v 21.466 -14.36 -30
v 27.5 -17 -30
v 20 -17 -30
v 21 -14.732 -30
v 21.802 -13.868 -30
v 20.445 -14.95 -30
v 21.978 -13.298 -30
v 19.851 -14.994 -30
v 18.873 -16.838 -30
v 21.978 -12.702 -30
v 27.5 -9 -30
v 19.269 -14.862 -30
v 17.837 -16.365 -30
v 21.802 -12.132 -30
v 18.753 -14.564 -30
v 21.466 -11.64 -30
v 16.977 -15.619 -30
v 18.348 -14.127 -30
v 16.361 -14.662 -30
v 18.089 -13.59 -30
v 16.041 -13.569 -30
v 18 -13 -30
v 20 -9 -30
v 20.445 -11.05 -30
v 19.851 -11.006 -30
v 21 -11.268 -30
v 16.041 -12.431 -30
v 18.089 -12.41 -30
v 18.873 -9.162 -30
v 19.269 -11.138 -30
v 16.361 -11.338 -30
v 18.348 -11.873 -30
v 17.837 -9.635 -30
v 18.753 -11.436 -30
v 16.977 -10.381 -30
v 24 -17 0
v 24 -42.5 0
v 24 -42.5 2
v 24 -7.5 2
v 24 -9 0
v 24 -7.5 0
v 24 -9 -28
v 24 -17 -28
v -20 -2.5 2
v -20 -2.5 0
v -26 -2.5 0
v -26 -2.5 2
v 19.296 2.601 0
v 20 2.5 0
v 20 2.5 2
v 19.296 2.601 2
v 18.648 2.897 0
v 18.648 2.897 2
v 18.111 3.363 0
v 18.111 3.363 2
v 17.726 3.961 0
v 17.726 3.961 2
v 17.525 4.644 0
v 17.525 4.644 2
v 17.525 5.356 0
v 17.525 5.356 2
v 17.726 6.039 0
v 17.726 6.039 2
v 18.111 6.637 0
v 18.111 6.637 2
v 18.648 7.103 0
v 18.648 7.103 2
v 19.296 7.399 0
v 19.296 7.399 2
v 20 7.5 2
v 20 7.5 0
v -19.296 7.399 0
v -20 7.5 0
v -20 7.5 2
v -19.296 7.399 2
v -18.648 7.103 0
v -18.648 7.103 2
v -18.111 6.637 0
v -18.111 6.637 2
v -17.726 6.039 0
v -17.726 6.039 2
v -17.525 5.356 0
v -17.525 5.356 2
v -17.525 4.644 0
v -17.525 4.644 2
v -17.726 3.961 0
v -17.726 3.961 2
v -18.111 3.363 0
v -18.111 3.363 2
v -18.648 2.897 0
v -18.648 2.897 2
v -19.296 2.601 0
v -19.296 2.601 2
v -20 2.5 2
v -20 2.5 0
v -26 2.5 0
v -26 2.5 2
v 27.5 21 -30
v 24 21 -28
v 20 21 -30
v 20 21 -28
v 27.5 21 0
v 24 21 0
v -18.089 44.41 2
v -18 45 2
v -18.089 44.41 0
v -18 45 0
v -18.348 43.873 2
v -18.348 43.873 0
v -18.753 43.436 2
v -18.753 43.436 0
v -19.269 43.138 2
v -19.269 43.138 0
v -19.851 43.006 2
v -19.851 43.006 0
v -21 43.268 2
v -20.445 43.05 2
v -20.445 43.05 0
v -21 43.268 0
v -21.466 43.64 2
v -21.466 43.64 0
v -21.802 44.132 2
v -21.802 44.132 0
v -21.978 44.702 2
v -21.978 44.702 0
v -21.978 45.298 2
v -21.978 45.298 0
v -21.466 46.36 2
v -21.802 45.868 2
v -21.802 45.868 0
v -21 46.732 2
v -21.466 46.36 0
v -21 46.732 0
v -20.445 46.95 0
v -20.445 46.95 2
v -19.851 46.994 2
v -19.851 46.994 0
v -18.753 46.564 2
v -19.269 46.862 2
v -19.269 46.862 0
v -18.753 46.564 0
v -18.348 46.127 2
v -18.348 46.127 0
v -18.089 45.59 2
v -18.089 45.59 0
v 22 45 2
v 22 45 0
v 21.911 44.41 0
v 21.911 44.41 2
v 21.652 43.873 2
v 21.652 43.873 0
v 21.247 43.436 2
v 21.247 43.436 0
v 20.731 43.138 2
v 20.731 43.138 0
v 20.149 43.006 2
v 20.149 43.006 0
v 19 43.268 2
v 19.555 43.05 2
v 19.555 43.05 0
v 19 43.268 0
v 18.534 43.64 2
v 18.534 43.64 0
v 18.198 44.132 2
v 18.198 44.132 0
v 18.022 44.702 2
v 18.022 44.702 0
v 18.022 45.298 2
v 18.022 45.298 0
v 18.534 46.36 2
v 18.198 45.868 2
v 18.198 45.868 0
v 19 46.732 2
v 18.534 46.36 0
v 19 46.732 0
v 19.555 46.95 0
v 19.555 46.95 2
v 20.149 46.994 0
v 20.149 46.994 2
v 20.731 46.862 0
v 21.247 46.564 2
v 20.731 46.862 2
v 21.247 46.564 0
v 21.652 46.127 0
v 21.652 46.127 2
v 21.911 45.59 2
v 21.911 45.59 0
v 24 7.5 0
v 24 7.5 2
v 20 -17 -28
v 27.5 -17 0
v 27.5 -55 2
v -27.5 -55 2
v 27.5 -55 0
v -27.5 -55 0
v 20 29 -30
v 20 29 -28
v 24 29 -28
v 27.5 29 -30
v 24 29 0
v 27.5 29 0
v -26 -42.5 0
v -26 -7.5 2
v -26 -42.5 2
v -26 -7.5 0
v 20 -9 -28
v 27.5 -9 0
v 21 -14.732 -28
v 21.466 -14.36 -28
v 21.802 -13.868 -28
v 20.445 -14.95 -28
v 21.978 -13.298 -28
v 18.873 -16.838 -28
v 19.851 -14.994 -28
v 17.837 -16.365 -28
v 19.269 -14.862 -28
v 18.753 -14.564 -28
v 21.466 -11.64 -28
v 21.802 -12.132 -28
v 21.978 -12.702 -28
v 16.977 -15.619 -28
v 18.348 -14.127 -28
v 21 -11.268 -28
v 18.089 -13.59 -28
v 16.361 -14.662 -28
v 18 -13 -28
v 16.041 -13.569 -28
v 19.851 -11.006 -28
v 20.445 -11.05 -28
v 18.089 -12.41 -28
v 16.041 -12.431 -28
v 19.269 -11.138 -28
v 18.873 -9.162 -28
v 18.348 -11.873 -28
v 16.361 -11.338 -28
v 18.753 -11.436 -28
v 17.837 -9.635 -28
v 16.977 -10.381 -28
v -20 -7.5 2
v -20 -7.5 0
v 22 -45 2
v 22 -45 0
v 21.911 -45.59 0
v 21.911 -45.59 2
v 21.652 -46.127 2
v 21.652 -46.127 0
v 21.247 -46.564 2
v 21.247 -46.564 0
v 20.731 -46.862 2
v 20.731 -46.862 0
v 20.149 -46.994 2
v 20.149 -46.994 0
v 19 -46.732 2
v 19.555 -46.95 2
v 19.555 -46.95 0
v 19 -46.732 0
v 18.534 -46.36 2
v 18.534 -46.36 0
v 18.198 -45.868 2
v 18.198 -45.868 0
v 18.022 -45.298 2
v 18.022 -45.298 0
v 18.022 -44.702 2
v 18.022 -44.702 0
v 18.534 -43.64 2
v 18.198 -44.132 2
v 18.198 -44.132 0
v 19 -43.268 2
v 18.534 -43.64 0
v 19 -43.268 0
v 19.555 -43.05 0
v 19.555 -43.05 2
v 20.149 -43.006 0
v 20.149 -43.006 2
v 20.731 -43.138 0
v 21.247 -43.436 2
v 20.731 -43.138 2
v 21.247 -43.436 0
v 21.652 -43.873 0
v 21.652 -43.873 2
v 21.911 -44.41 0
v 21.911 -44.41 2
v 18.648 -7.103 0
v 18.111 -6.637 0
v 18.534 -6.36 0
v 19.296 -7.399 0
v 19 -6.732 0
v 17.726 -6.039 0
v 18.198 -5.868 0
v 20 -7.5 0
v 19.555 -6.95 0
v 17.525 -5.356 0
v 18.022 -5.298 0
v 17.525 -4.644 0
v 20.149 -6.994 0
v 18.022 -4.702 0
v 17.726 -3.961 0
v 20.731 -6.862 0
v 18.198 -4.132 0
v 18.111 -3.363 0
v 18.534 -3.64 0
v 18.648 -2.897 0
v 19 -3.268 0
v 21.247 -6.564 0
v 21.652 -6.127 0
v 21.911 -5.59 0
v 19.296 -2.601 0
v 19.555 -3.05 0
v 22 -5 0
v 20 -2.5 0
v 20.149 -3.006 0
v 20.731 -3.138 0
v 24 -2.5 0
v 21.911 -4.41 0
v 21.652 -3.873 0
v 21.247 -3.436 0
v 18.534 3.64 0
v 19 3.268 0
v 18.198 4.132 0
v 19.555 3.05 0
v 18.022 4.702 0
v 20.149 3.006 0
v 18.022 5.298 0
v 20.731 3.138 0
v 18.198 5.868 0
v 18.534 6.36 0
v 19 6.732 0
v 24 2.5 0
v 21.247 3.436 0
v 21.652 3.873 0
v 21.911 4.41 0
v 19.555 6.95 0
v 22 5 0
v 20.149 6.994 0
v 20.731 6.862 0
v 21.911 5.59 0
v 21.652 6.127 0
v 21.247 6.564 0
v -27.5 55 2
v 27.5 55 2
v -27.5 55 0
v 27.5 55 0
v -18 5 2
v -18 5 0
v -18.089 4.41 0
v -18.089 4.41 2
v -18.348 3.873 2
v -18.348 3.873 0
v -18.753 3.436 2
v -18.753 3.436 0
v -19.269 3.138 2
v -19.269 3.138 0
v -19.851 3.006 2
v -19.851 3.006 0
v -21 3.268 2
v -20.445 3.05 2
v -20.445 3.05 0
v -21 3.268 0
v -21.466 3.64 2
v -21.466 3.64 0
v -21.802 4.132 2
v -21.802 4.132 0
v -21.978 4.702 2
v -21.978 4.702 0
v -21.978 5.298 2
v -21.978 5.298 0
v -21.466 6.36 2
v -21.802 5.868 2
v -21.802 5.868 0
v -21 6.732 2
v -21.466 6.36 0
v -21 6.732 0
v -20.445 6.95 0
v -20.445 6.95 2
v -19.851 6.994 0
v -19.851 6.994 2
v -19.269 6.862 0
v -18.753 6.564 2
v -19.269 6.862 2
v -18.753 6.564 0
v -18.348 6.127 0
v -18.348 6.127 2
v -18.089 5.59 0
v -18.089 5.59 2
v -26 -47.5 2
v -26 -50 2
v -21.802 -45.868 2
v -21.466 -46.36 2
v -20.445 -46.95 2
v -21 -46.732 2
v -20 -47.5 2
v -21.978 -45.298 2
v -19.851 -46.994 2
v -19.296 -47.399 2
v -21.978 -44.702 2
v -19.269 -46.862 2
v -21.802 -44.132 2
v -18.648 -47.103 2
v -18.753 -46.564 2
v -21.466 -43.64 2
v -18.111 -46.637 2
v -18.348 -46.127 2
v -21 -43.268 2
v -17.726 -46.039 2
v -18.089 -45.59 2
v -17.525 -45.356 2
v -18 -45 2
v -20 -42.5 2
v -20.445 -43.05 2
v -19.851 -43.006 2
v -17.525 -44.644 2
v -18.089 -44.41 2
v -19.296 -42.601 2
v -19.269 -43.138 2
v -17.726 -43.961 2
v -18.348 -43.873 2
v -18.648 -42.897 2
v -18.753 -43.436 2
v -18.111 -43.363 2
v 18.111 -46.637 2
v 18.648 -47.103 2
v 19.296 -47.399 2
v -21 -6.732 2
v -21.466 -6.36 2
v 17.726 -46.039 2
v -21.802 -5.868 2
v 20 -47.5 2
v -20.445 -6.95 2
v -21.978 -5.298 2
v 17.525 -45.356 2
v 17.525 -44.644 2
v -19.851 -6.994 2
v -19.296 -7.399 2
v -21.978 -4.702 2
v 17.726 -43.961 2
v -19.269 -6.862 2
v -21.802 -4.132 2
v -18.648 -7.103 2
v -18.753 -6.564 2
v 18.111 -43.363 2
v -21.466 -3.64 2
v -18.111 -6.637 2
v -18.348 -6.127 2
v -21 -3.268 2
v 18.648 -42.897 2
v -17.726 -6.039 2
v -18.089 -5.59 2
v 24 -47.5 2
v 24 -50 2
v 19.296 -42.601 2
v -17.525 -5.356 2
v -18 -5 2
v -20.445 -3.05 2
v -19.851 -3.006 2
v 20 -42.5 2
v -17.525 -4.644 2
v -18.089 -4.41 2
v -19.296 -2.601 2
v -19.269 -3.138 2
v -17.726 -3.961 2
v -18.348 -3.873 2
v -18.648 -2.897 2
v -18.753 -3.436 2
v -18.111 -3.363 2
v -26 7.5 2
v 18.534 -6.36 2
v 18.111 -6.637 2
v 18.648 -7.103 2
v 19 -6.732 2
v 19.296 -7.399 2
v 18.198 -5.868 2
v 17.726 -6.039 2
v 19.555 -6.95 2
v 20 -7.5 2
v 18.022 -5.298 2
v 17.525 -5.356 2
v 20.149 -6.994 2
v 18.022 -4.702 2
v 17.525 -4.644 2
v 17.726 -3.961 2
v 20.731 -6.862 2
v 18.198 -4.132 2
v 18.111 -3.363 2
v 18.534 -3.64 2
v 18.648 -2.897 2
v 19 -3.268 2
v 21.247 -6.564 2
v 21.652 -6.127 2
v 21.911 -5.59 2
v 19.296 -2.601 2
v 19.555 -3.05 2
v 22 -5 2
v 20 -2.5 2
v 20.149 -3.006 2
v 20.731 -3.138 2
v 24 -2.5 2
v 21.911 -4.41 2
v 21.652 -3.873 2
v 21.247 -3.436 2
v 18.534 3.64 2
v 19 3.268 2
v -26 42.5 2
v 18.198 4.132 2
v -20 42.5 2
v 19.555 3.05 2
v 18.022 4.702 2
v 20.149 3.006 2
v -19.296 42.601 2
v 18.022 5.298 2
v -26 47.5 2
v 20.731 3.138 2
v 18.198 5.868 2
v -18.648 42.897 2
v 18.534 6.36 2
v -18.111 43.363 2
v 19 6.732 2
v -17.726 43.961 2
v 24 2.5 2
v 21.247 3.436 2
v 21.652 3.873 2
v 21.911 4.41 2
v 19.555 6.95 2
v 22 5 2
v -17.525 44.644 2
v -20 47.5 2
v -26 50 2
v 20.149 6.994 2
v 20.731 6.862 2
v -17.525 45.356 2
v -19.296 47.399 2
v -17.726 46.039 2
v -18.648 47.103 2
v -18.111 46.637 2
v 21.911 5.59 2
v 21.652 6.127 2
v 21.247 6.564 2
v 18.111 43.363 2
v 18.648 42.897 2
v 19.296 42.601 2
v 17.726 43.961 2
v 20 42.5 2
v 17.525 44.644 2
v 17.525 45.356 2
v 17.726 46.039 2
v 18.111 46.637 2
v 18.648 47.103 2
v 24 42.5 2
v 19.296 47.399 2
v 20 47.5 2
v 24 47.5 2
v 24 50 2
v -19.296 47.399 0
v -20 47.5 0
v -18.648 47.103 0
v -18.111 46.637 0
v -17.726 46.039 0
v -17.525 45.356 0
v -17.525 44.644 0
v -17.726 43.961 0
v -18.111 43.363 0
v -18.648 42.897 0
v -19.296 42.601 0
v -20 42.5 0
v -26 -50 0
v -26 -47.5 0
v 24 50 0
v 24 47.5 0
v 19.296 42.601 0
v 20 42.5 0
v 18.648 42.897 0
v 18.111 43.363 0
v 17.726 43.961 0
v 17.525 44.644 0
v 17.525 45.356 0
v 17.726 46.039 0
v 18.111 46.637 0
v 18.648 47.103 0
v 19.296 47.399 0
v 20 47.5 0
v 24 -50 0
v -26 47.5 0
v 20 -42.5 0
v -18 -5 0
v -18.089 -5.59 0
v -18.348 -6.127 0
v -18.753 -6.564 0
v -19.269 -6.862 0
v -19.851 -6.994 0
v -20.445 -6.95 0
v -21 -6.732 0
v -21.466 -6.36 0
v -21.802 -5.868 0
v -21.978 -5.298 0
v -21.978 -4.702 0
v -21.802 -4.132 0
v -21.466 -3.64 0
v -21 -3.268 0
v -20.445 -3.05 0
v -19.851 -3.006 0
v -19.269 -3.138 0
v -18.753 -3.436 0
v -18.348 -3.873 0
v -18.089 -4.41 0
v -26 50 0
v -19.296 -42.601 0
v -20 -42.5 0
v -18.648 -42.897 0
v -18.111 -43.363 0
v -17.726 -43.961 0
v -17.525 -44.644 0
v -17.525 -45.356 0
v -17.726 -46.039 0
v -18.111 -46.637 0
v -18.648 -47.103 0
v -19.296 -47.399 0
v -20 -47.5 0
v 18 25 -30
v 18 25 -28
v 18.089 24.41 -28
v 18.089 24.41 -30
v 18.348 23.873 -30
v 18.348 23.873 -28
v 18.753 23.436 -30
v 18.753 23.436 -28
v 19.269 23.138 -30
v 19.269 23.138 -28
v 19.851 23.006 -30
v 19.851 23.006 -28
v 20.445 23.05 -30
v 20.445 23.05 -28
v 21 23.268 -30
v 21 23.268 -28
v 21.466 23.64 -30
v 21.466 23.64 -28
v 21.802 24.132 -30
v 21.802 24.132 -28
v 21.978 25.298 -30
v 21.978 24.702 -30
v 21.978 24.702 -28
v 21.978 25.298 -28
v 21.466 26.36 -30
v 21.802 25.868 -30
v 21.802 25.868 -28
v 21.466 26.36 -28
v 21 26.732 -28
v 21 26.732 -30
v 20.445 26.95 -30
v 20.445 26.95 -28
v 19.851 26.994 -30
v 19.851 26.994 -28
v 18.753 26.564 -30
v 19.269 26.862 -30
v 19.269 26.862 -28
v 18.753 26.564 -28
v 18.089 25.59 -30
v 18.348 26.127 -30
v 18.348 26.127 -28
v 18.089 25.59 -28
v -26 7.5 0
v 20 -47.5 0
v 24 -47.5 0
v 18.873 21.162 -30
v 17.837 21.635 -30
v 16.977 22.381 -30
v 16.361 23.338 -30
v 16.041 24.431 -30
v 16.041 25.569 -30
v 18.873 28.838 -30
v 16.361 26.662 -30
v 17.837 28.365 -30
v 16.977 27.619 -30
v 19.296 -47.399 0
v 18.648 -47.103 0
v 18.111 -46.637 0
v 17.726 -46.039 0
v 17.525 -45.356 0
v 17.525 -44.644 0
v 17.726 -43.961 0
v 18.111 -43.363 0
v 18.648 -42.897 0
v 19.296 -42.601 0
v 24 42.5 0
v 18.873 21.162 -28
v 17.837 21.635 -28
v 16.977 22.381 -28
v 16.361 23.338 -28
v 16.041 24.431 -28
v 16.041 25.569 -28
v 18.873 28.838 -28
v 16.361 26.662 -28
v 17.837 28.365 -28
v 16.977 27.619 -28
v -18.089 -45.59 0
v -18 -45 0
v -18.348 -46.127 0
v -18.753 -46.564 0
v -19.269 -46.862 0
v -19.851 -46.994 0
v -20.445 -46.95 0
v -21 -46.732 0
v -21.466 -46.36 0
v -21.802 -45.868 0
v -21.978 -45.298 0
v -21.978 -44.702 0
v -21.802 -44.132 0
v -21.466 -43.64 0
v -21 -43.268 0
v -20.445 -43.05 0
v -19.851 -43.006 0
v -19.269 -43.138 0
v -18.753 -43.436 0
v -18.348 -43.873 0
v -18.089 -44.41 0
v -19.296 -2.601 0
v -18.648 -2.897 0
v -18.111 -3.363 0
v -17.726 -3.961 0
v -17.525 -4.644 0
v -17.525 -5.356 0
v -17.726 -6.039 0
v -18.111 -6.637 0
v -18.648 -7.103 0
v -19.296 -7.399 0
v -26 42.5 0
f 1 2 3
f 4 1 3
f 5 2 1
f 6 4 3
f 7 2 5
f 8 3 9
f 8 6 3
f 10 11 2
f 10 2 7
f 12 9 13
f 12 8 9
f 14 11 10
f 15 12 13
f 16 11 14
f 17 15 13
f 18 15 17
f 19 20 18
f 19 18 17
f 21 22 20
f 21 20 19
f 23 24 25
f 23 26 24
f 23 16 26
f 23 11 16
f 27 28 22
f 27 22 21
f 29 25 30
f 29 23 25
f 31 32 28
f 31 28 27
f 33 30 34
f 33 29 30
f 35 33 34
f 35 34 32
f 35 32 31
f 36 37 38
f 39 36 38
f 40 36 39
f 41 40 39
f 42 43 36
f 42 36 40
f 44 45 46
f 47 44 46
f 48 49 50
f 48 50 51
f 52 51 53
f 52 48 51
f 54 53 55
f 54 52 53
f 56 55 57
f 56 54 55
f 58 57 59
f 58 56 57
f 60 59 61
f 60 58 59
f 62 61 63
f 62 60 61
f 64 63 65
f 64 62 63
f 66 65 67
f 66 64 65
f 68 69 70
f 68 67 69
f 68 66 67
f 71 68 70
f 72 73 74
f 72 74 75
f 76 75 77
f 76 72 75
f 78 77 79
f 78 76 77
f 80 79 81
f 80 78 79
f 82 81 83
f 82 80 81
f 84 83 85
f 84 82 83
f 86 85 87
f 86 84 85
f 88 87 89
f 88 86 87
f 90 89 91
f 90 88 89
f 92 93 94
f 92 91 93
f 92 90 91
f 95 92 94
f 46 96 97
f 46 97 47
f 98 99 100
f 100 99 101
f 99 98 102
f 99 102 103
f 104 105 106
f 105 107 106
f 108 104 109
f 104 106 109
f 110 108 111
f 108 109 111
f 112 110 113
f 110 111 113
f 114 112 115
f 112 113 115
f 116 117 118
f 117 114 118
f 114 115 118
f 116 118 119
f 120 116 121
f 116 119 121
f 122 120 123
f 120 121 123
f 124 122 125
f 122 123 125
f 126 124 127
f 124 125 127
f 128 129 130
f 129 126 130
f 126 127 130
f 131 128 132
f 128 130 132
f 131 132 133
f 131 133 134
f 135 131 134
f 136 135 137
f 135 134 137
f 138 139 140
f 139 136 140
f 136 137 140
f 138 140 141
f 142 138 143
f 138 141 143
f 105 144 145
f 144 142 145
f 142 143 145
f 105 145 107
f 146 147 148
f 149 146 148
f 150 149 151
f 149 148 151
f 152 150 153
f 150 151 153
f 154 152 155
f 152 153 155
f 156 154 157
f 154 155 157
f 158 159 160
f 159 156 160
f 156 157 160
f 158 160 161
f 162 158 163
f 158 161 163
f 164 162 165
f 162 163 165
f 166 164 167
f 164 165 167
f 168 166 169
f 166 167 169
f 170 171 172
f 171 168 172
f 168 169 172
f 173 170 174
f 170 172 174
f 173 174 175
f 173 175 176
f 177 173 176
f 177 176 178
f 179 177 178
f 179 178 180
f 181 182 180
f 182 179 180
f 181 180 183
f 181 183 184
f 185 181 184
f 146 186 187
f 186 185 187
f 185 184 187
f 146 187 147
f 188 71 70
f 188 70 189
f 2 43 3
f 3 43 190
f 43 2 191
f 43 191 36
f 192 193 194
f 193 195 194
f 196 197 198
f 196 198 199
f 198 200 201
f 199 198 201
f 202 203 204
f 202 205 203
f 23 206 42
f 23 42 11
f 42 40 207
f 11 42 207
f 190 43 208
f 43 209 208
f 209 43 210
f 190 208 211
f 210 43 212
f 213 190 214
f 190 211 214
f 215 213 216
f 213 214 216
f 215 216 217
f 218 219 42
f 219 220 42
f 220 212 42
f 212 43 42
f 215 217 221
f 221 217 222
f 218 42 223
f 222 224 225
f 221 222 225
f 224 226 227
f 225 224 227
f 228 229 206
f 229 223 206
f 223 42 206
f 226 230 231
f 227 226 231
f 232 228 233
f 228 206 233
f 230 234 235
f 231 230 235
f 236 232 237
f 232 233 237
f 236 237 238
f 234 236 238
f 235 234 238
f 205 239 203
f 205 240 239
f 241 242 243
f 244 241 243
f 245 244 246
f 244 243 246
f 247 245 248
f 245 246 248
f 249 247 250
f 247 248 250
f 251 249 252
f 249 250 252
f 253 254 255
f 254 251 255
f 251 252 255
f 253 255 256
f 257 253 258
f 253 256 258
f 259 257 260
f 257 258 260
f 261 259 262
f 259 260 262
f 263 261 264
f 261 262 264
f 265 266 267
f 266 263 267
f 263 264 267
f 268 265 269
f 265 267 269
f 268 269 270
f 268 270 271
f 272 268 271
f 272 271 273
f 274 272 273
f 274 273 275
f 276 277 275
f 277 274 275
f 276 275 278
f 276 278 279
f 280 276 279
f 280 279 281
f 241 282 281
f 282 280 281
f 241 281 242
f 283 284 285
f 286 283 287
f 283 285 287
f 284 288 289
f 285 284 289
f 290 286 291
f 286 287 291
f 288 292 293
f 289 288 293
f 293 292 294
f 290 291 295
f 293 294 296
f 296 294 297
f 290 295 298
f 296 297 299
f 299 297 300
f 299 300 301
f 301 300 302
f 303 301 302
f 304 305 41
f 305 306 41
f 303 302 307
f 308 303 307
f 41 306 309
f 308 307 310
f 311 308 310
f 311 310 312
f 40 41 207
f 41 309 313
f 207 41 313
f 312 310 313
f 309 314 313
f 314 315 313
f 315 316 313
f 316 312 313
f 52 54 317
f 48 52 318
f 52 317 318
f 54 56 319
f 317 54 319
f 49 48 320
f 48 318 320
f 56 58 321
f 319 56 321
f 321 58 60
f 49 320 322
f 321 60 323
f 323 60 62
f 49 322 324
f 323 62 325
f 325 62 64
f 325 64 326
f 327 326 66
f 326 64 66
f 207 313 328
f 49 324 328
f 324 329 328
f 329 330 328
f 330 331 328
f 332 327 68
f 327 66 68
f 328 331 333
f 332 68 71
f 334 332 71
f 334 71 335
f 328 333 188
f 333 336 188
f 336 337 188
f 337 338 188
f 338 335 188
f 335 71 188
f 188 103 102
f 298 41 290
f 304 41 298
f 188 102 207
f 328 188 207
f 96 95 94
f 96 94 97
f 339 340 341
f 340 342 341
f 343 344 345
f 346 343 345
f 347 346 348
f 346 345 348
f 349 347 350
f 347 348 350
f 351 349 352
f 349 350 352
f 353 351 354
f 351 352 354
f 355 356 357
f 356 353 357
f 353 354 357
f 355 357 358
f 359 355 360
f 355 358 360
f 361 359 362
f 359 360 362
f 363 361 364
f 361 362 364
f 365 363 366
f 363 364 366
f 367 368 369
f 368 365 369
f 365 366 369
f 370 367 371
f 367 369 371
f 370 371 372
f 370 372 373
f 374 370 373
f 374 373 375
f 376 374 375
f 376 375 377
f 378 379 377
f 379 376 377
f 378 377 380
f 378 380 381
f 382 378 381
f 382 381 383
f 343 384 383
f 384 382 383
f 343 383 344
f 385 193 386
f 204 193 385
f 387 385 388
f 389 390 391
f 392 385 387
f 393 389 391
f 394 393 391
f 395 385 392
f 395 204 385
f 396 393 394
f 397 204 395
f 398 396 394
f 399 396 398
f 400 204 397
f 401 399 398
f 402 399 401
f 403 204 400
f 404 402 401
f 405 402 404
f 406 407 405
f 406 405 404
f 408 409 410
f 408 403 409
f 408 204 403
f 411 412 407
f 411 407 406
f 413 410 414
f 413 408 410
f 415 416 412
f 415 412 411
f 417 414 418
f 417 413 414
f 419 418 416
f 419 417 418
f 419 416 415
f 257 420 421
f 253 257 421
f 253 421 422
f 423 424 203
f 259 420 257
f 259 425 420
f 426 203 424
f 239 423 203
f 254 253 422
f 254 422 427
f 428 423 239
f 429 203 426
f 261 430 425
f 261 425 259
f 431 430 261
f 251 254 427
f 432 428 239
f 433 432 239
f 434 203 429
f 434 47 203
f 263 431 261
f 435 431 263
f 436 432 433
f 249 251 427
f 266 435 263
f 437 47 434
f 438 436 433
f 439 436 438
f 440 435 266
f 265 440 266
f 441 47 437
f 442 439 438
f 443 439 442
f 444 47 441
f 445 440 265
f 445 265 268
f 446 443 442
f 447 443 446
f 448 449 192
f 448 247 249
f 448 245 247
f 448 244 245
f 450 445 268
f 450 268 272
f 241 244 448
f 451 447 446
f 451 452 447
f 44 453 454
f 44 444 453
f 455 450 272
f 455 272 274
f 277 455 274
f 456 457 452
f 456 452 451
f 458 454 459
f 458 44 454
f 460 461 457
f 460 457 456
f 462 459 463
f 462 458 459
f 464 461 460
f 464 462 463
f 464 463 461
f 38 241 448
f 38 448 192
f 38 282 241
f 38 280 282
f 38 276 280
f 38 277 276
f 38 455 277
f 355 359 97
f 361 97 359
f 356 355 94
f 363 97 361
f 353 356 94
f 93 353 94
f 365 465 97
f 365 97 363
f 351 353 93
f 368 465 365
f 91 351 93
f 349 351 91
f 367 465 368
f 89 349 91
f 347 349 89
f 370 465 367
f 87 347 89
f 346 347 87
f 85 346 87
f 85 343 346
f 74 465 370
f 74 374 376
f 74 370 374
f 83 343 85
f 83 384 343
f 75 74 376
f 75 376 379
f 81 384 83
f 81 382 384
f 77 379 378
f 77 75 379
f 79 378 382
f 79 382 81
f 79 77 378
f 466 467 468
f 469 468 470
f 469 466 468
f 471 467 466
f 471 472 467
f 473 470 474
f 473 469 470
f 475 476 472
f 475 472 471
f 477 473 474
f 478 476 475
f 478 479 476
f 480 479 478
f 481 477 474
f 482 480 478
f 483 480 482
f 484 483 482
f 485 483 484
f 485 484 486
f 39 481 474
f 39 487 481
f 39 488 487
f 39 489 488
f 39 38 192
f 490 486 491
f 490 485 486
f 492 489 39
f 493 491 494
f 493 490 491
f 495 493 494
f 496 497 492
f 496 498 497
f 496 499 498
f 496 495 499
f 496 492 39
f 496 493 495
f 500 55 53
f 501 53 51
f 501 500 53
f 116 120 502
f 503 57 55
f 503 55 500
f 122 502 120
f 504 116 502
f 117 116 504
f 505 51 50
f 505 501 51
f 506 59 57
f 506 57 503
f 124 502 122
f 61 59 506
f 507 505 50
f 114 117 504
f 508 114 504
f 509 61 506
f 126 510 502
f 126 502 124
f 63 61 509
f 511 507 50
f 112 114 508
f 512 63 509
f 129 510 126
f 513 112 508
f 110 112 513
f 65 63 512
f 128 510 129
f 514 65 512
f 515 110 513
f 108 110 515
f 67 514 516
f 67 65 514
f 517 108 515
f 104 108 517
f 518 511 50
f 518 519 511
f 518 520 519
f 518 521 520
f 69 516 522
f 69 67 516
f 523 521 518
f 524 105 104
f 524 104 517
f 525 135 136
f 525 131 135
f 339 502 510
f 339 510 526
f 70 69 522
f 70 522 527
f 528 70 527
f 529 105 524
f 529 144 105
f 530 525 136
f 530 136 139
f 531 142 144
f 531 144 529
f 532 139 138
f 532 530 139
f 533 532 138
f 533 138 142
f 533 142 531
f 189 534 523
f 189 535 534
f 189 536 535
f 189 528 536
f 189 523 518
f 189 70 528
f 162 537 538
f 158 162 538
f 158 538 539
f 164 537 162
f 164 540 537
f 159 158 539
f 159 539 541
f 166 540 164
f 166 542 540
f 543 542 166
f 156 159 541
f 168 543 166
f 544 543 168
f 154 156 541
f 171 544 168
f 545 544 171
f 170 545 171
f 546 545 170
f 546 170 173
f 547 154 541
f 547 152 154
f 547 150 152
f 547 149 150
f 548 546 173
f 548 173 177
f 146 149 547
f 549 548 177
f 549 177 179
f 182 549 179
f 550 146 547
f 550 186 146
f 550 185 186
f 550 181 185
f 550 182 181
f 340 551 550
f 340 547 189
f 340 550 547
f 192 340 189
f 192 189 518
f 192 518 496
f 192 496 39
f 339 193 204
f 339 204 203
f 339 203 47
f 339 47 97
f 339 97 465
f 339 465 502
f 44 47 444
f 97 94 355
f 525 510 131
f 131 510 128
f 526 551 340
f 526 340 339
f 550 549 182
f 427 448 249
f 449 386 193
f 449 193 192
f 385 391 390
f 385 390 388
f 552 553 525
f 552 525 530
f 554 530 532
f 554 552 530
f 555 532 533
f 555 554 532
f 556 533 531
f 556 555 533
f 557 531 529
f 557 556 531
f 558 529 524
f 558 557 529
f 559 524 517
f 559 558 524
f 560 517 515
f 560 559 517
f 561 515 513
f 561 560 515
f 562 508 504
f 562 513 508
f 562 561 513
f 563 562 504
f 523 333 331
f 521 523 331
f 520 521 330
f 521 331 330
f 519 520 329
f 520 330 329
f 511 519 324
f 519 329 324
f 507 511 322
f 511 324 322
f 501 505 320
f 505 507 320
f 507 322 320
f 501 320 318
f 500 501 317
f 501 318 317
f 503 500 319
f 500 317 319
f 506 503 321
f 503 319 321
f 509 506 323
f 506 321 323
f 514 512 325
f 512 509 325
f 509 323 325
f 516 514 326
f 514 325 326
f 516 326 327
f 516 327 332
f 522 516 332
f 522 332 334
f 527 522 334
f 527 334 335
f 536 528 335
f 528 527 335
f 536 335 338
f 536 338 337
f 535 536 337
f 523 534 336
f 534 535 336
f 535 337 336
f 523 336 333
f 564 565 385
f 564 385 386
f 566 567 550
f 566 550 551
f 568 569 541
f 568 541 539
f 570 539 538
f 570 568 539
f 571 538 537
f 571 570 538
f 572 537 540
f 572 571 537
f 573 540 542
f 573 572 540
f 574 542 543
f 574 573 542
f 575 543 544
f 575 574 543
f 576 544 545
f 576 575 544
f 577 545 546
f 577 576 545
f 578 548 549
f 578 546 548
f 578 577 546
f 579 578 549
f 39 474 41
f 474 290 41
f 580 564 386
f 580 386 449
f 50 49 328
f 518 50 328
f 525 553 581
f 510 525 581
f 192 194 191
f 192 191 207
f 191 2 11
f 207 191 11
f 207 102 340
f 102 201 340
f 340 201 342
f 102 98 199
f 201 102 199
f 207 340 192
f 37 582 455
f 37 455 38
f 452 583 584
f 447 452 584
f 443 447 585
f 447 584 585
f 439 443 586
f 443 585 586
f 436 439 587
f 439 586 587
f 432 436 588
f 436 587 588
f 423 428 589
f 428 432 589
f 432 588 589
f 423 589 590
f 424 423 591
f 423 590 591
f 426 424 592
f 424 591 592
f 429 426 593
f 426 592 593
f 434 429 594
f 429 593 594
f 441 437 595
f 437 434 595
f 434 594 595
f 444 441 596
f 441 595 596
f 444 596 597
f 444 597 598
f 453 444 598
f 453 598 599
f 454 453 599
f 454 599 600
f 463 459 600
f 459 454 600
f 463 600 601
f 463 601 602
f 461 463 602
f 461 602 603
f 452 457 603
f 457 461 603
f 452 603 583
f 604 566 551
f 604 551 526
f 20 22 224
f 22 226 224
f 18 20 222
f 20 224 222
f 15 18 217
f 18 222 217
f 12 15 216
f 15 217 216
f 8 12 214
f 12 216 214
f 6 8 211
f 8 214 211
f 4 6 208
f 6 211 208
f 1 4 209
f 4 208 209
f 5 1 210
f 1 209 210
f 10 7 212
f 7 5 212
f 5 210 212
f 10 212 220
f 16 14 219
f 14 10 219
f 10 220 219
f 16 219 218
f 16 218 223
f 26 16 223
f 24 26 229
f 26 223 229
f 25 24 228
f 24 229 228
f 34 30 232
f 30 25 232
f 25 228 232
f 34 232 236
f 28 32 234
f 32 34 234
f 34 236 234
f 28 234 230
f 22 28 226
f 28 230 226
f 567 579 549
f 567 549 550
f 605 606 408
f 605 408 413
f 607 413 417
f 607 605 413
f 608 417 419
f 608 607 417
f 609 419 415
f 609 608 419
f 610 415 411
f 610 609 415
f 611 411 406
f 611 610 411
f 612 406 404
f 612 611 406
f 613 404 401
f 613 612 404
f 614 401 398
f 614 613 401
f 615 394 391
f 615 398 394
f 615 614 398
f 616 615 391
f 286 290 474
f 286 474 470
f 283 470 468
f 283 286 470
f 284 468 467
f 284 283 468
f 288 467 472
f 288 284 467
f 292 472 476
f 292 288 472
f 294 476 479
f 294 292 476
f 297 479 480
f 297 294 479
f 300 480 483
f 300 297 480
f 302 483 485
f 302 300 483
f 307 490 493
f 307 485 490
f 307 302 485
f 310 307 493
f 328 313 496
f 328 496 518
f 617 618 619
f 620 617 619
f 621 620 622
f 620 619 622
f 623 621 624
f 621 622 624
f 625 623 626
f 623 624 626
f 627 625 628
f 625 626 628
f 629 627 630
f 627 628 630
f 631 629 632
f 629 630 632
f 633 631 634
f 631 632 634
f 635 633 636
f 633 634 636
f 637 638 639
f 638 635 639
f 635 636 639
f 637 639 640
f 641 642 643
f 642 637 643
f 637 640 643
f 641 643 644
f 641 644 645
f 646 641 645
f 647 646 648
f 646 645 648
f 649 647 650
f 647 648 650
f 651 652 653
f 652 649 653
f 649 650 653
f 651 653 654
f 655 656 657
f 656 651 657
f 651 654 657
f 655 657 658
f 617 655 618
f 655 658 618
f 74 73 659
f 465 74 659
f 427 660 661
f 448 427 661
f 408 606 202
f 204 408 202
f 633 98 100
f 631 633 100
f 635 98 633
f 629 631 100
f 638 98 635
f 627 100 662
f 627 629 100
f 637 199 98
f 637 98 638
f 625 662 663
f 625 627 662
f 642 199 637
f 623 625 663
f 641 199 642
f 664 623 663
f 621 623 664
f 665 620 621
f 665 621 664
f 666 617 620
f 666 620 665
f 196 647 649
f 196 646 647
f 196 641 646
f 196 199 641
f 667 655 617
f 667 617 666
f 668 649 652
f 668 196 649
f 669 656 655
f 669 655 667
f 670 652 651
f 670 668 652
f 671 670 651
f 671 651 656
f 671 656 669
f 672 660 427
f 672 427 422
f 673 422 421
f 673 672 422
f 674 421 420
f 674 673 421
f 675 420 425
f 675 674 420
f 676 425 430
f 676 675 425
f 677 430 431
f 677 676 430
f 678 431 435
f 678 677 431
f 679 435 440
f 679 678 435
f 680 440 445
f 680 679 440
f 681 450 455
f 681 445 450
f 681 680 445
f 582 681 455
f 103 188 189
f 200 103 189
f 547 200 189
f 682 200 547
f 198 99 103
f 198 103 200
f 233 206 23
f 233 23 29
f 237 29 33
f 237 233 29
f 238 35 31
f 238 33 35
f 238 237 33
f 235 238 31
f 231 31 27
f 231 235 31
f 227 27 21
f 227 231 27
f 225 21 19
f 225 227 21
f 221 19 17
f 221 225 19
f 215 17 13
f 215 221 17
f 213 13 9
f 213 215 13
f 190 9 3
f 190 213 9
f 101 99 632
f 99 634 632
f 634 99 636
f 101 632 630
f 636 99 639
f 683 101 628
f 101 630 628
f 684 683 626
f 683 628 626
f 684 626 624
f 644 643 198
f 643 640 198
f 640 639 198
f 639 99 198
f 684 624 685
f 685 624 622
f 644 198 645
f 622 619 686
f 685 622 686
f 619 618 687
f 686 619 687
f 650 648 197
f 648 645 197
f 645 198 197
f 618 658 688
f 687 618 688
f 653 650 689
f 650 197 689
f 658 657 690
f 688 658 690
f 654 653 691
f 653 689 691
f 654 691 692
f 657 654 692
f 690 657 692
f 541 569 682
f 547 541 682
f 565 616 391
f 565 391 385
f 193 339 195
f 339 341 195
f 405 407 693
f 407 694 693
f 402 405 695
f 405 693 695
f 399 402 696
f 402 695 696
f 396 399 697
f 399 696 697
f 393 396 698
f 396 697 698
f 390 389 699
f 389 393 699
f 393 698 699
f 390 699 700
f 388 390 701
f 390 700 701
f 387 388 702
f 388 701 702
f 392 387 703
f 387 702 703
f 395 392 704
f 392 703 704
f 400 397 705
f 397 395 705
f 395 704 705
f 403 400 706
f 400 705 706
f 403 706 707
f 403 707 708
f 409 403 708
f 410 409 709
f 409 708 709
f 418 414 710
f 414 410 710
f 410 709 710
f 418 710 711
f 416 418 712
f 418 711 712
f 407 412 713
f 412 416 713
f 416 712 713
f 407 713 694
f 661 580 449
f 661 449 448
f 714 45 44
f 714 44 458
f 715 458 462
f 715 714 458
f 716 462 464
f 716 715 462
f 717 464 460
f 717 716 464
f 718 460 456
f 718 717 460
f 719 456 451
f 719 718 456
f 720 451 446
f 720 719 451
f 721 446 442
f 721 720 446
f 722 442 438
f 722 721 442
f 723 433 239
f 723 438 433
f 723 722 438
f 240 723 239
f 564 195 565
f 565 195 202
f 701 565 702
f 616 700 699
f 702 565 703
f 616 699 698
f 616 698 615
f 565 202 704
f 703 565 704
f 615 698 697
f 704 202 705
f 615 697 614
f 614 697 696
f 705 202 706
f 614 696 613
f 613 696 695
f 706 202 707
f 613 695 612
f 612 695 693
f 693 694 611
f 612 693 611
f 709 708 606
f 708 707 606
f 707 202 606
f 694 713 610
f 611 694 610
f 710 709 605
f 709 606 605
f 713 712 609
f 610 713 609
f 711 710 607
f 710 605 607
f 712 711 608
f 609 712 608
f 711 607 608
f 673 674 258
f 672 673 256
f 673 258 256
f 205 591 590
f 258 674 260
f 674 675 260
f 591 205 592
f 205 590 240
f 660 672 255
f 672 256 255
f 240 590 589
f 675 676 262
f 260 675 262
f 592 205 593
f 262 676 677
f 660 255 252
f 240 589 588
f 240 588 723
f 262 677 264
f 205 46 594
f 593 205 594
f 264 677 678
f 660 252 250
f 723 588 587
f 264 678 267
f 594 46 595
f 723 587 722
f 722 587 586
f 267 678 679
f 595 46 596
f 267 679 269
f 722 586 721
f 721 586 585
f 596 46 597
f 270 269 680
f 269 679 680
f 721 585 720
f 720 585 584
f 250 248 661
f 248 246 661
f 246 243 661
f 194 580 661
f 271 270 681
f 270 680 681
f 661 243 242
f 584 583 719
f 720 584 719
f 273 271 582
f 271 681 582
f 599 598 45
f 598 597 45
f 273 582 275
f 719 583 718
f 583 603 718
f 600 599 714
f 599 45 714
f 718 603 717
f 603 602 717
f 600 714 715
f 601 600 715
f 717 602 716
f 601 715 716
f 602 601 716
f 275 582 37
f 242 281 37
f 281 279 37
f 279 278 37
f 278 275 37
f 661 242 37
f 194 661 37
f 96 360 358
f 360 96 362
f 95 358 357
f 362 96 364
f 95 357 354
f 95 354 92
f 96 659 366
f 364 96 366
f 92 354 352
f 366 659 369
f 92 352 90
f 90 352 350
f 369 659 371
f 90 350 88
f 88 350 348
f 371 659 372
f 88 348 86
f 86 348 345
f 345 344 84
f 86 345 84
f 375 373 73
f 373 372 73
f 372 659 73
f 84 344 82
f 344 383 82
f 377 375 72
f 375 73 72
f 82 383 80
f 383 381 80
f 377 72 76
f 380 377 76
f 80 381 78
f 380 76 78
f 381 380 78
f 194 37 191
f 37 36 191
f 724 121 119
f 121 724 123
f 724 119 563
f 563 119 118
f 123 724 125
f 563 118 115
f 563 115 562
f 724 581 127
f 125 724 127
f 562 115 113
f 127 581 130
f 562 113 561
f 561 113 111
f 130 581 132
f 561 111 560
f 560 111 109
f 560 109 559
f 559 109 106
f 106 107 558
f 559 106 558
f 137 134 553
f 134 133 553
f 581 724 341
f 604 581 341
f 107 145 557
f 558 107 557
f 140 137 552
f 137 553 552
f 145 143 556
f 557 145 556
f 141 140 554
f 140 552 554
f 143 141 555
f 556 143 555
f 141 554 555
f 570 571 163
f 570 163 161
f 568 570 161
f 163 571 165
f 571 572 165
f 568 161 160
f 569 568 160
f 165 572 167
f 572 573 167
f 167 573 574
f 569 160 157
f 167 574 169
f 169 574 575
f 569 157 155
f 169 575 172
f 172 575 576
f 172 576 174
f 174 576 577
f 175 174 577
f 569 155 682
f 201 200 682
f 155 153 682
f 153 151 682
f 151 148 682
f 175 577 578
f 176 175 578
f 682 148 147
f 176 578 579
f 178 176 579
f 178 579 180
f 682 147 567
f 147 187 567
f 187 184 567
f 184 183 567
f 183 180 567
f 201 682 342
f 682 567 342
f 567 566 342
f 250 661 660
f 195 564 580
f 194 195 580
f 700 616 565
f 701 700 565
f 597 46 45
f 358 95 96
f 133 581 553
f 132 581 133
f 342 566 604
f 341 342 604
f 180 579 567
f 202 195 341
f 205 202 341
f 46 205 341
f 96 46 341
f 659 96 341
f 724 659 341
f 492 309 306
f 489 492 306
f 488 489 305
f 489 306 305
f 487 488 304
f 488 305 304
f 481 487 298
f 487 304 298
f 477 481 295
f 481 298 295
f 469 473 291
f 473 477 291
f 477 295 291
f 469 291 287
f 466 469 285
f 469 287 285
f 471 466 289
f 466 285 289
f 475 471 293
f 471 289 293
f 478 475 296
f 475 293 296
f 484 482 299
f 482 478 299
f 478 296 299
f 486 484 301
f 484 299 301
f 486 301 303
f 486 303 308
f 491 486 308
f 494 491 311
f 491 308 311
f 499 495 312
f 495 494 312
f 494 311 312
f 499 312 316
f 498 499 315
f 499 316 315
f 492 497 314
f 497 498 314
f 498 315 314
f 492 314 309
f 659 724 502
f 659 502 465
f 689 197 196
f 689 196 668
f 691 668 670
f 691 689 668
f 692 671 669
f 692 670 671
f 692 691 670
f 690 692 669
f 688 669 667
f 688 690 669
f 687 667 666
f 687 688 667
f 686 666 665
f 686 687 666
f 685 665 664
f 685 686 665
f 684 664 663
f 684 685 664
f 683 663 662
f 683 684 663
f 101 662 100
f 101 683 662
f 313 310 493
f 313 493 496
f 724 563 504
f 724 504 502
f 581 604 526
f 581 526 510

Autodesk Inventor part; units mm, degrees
ref_plane "YZ Plane" through (0, 0, 0) normal (1, 0, 0) x (0, 1, 0)
ref_plane "XZ Plane" through (0, 0, 0) normal (0, 1, 0) x (-1, 0, 0)
ref_plane "XY Plane" through (0, 0, 0) normal (0, 0, 1) x (1, 0, 0)
sketch "Sketch1" plane through (0, 0, 0) normal (0, 0, 1) x (1, 0, 0)
  line L0 (-27.5, -55) -> (27.5, -55)
  line L1 (27.5, -55) -> (27.5, 55)
  line L2 (27.5, 55) -> (-27.5, 55)
  line L3 (-27.5, 55) -> (-27.5, -55)
  line L4 (-27.5, -55) -> (27.5, 55) construction
  line L5 (27.5, -55) -> (-27.5, 55) construction
  line L6 (0, -77) -> (0, 77) projected
  line L7 (-38.5, 0) -> (38.5, 0) projected
  circle A0 centre (-20, 45) radius 2
  circle A1 centre (-20, 5) radius 2
  circle A2 centre (20, 45) radius 2
  circle A3 centre (20, 5) radius 2
  circle A4 centre (-20, -5) radius 2
  circle A5 centre (-20, -45) radius 2
  circle A6 centre (20, -45) radius 2
  circle A7 centre (20, -5) radius 2
  arc A8 (-20, 42.5) -> (-20, 47.5) centre (-20, 45) ccw
  arc A9 (20, 47.5) -> (20, 42.5) centre (20, 45) ccw
  arc A10 (-20, 2.5) -> (-20, 7.5) centre (-20, 5) ccw
  arc A11 (20, 7.5) -> (20, 2.5) centre (20, 5) ccw
  arc A12 (-20, -7.5) -> (-20, -2.5) centre (-20, -5) ccw
  arc A13 (20, -2.5) -> (20, -7.5) centre (20, -5) ccw
  arc A14 (-20, -47.5) -> (-20, -42.5) centre (-20, -45) ccw
  arc A15 (20, -42.5) -> (20, -47.5) centre (20, -45) ccw
  line L8 (-26, -50) -> (24, -50)
  line L9 (24, -50) -> (24, 50)
  line L10 (24, 50) -> (-26, 50)
  line L11 (-26, 50) -> (-26, -50)
  line L12 (-20, 47.5) -> (-26, 47.5)
  line L13 (-20, 42.5) -> (-26, 42.5)
  line L14 (20, 47.5) -> (24, 47.5)
  line L15 (20, 42.5) -> (24, 42.5)
  line L16 (20, 7.5) -> (24, 7.5)
  line L17 (20, 2.5) -> (24, 2.5)
  line L18 (20, -2.5) -> (24, -2.5)
  line L19 (20, -7.5) -> (24, -7.5)
  line L20 (20, -42.5) -> (24, -42.5)
  line L21 (-20, 7.5) -> (-26, 7.5)
  line L22 (-20, 2.5) -> (-26, 2.5)
  line L23 (-20, -2.5) -> (-26, -2.5)
  line L24 (-20, -7.5) -> (-26, -7.5)
  line L25 (-20, -42.5) -> (-26, -42.5)
  line L26 (-20, -47.5) -> (-26, -47.5)
  line L27 (20, -47.5) -> (24, -47.5)
  point P0 (0, 0)
  point P1 (-17.5, 45)
  dimension "d0" = 55
  dimension "d1" = 110
  dimension "d5" = 40
  dimension "d6" = 40
  dimension "d7" = 4
  dimension "d8" = 90
  dimension "d9" = 2.5
  dimension "d10" = 5
  dimension "d12" = 6
  dimension "d13" = 4
extrude "Extrusion1" add sketch "Sketch1" along normal blind 2 contours L3 L7 L11 L8 L6 L0 | L6 L8 L9 L7 L1 L0 | L3 L2 L6 L10 L11 L7 | L7 L9 L10 L6 L2 L1 | L11 L21 A10 L22 | L23 A12 L24 L11 | L11 L25 A14 L26 | L27 A15 L20 L9 | L9 L19 A13 L18 | L17 A11 L16 L9 | L11 L12 A8 L13 | L9 L15 A9 L14
sketch "Sketch3" plane through (0, 0, 0) normal (0, 0, -1) x (-1, 0, 0)
  line L0 (-27.5, 55) -> (27.5, 55) projected
  line L1 (-16, 55) -> (-24, 55)
  line L2 (-27.5, 55) -> (27.5, 55) projected
  line L3 (-27.5, -55) -> (-27.5, 55) projected
  line L4 (27.5, -55) -> (-27.5, -55) projected
  line L5 (27.5, 55) -> (27.5, -55) projected
  circle A0 centre (-20, -5) radius 2 projected
  circle A1 centre (-20, 45) radius 2 projected
  circle A2 centre (20, 45) radius 2 projected
  circle A3 centre (-20, 5) radius 2 projected
  circle A4 centre (20, -5) radius 2 projected
  circle A5 centre (-20, -45) radius 2 projected
  circle A6 centre (20, -45) radius 2 projected
  circle A7 centre (20, 5) radius 2 projected
  line L6 (-24, 2.5) -> (-24, -2.5) projected
  line L7 (-20, 2.5) -> (-24, 2.5) projected
  arc A8 (-20, 2.5) -> (-20, 7.5) centre (-20, 5) ccw projected
  line L8 (-24, 7.5) -> (-20, 7.5) projected
  line L9 (-24, 42.5) -> (-24, 7.5) projected
  line L10 (-20, 42.5) -> (-24, 42.5) projected
  arc A9 (-20, 42.5) -> (-20, 47.5) centre (-20, 45) ccw projected
  line L11 (-24, 47.5) -> (-20, 47.5) projected
  line L12 (-24, 50) -> (-24, 47.5) projected
  line L13 (26, 50) -> (-24, 50) projected
  line L14 (26, 47.5) -> (26, 50) projected
  line L15 (20, 47.5) -> (26, 47.5) projected
  arc A10 (20, 47.5) -> (20, 42.5) centre (20, 45) ccw projected
  line L16 (26, 42.5) -> (20, 42.5) projected
  line L17 (26, 7.5) -> (26, 42.5) projected
  line L18 (20, 7.5) -> (26, 7.5) projected
  arc A11 (20, 7.5) -> (20, 2.5) centre (20, 5) ccw projected
  line L19 (26, 2.5) -> (20, 2.5) projected
  line L20 (26, -2.5) -> (26, 2.5) projected
  line L21 (20, -2.5) -> (26, -2.5) projected
  arc A12 (20, -2.5) -> (20, -7.5) centre (20, -5) ccw projected
  line L22 (26, -7.5) -> (20, -7.5) projected
  line L23 (26, -42.5) -> (26, -7.5) projected
  line L24 (20, -42.5) -> (26, -42.5) projected
  arc A13 (20, -42.5) -> (20, -47.5) centre (20, -45) ccw projected
  line L25 (26, -47.5) -> (20, -47.5) projected
  line L26 (26, -50) -> (26, -47.5) projected
  line L27 (-24, -50) -> (26, -50) projected
  line L28 (-24, -47.5) -> (-24, -50) projected
  line L29 (-20, -47.5) -> (-24, -47.5) projected
  arc A14 (-20, -47.5) -> (-20, -42.5) centre (-20, -45) ccw projected
  line L30 (-24, -42.5) -> (-20, -42.5) projected
  line L31 (-24, -7.5) -> (-24, -42.5) projected
  line L32 (-20, -7.5) -> (-24, -7.5) projected
  arc A15 (-20, -7.5) -> (-20, -2.5) centre (-20, -5) ccw projected
  line L33 (-24, -2.5) -> (-20, -2.5) projected
  line L34 (14, 50) -> (22, 50)
  line L35 (22, 55) -> (14, 55)
  line L36 (-27.5, -17) -> (-24, -17)
  line L37 (-24, -17) -> (-24, -9)
  line L38 (-24, -9) -> (-27.5, -9)
  line L39 (-27.5, -9) -> (-27.5, -17)
  line L40 (-27.5, -17) -> (-24, -9) construction
  line L41 (-24, -17) -> (-27.5, -9) construction
  line L42 (-24, 29) -> (-27.5, 29)
  line L43 (-27.5, 29) -> (-27.5, 21)
  line L44 (-27.5, 21) -> (-24, 21)
  line L45 (-24, 21) -> (-24, 29)
  line L46 (-24, 29) -> (-27.5, 21) construction
  line L47 (-27.5, 29) -> (-24, 21) construction
  point P0 (0, 0)
  point P1 (-25.75, -13)
  point P2 (-27.5, -17)
  point P3 (-24, 10.5)
  point P4 (-25.75, 25)
  dimension "d22" = 8
  dimension "d40" = 38
  dimension "d41" = 25
extrude "Extrusion3" add sketch "Sketch3" along normal blind 28 contours L42 L9 L44 L3 | L38 L31 L36 L3
sketch "Sketch5" plane through (0, 0, -28) normal (0, 0, -1) x (-1, 0, 0)
  line L0 (-27.5, -9) -> (-27.5, -17) projected
  line L1 (-24, 21) -> (-24, 29) projected
  circle A0 centre (-20, -13) radius 2
  line L2 (-27.5, -9) -> (-27.5, -17) projected
  arc A1 (-20, -17) -> (-20, -9) centre (-20, -13) ccw
  line L3 (-20, -17) -> (-24, -17)
  line L4 (-24, -9) -> (-20, -9)
  line L5 (-24, -17) -> (-24, -9) projected
  line L6 (-24, 29) -> (-27.5, 29) projected
  line L7 (-27.5, 29) -> (-27.5, 21) projected
  line L8 (-27.5, 21) -> (-24, 21) projected
  line L9 (-27.5, -17) -> (-24, -17) projected
  line L10 (-24, -9) -> (-27.5, -9) projected
  circle A2 centre (-20, 25) radius 2
  arc A3 (-20, 21) -> (-20, 29) centre (-20, 25) ccw
  line L11 (-20, 21) -> (-24, 21)
  line L12 (-24, 29) -> (-27.5, 29) projected
  line L13 (-24, 29) -> (-20, 29)
  point P0 (0, 0)
  point P1 (-27.5, -13)
  point P2 (-27.5, -13)
  point P3 (-16, -13)
  point P4 (-24, 13)
  point P5 (-24, -17)
  point P6 (-24, -9)
  point P7 (-24, 25)
  point P8 (-16, 25)
  dimension "d36" = 4
  dimension "d37" = 8
extrude "Extrusion5" add sketch "Sketch5" along normal blind 2
properties part number "MTN_PLATE_RETROFIT"
